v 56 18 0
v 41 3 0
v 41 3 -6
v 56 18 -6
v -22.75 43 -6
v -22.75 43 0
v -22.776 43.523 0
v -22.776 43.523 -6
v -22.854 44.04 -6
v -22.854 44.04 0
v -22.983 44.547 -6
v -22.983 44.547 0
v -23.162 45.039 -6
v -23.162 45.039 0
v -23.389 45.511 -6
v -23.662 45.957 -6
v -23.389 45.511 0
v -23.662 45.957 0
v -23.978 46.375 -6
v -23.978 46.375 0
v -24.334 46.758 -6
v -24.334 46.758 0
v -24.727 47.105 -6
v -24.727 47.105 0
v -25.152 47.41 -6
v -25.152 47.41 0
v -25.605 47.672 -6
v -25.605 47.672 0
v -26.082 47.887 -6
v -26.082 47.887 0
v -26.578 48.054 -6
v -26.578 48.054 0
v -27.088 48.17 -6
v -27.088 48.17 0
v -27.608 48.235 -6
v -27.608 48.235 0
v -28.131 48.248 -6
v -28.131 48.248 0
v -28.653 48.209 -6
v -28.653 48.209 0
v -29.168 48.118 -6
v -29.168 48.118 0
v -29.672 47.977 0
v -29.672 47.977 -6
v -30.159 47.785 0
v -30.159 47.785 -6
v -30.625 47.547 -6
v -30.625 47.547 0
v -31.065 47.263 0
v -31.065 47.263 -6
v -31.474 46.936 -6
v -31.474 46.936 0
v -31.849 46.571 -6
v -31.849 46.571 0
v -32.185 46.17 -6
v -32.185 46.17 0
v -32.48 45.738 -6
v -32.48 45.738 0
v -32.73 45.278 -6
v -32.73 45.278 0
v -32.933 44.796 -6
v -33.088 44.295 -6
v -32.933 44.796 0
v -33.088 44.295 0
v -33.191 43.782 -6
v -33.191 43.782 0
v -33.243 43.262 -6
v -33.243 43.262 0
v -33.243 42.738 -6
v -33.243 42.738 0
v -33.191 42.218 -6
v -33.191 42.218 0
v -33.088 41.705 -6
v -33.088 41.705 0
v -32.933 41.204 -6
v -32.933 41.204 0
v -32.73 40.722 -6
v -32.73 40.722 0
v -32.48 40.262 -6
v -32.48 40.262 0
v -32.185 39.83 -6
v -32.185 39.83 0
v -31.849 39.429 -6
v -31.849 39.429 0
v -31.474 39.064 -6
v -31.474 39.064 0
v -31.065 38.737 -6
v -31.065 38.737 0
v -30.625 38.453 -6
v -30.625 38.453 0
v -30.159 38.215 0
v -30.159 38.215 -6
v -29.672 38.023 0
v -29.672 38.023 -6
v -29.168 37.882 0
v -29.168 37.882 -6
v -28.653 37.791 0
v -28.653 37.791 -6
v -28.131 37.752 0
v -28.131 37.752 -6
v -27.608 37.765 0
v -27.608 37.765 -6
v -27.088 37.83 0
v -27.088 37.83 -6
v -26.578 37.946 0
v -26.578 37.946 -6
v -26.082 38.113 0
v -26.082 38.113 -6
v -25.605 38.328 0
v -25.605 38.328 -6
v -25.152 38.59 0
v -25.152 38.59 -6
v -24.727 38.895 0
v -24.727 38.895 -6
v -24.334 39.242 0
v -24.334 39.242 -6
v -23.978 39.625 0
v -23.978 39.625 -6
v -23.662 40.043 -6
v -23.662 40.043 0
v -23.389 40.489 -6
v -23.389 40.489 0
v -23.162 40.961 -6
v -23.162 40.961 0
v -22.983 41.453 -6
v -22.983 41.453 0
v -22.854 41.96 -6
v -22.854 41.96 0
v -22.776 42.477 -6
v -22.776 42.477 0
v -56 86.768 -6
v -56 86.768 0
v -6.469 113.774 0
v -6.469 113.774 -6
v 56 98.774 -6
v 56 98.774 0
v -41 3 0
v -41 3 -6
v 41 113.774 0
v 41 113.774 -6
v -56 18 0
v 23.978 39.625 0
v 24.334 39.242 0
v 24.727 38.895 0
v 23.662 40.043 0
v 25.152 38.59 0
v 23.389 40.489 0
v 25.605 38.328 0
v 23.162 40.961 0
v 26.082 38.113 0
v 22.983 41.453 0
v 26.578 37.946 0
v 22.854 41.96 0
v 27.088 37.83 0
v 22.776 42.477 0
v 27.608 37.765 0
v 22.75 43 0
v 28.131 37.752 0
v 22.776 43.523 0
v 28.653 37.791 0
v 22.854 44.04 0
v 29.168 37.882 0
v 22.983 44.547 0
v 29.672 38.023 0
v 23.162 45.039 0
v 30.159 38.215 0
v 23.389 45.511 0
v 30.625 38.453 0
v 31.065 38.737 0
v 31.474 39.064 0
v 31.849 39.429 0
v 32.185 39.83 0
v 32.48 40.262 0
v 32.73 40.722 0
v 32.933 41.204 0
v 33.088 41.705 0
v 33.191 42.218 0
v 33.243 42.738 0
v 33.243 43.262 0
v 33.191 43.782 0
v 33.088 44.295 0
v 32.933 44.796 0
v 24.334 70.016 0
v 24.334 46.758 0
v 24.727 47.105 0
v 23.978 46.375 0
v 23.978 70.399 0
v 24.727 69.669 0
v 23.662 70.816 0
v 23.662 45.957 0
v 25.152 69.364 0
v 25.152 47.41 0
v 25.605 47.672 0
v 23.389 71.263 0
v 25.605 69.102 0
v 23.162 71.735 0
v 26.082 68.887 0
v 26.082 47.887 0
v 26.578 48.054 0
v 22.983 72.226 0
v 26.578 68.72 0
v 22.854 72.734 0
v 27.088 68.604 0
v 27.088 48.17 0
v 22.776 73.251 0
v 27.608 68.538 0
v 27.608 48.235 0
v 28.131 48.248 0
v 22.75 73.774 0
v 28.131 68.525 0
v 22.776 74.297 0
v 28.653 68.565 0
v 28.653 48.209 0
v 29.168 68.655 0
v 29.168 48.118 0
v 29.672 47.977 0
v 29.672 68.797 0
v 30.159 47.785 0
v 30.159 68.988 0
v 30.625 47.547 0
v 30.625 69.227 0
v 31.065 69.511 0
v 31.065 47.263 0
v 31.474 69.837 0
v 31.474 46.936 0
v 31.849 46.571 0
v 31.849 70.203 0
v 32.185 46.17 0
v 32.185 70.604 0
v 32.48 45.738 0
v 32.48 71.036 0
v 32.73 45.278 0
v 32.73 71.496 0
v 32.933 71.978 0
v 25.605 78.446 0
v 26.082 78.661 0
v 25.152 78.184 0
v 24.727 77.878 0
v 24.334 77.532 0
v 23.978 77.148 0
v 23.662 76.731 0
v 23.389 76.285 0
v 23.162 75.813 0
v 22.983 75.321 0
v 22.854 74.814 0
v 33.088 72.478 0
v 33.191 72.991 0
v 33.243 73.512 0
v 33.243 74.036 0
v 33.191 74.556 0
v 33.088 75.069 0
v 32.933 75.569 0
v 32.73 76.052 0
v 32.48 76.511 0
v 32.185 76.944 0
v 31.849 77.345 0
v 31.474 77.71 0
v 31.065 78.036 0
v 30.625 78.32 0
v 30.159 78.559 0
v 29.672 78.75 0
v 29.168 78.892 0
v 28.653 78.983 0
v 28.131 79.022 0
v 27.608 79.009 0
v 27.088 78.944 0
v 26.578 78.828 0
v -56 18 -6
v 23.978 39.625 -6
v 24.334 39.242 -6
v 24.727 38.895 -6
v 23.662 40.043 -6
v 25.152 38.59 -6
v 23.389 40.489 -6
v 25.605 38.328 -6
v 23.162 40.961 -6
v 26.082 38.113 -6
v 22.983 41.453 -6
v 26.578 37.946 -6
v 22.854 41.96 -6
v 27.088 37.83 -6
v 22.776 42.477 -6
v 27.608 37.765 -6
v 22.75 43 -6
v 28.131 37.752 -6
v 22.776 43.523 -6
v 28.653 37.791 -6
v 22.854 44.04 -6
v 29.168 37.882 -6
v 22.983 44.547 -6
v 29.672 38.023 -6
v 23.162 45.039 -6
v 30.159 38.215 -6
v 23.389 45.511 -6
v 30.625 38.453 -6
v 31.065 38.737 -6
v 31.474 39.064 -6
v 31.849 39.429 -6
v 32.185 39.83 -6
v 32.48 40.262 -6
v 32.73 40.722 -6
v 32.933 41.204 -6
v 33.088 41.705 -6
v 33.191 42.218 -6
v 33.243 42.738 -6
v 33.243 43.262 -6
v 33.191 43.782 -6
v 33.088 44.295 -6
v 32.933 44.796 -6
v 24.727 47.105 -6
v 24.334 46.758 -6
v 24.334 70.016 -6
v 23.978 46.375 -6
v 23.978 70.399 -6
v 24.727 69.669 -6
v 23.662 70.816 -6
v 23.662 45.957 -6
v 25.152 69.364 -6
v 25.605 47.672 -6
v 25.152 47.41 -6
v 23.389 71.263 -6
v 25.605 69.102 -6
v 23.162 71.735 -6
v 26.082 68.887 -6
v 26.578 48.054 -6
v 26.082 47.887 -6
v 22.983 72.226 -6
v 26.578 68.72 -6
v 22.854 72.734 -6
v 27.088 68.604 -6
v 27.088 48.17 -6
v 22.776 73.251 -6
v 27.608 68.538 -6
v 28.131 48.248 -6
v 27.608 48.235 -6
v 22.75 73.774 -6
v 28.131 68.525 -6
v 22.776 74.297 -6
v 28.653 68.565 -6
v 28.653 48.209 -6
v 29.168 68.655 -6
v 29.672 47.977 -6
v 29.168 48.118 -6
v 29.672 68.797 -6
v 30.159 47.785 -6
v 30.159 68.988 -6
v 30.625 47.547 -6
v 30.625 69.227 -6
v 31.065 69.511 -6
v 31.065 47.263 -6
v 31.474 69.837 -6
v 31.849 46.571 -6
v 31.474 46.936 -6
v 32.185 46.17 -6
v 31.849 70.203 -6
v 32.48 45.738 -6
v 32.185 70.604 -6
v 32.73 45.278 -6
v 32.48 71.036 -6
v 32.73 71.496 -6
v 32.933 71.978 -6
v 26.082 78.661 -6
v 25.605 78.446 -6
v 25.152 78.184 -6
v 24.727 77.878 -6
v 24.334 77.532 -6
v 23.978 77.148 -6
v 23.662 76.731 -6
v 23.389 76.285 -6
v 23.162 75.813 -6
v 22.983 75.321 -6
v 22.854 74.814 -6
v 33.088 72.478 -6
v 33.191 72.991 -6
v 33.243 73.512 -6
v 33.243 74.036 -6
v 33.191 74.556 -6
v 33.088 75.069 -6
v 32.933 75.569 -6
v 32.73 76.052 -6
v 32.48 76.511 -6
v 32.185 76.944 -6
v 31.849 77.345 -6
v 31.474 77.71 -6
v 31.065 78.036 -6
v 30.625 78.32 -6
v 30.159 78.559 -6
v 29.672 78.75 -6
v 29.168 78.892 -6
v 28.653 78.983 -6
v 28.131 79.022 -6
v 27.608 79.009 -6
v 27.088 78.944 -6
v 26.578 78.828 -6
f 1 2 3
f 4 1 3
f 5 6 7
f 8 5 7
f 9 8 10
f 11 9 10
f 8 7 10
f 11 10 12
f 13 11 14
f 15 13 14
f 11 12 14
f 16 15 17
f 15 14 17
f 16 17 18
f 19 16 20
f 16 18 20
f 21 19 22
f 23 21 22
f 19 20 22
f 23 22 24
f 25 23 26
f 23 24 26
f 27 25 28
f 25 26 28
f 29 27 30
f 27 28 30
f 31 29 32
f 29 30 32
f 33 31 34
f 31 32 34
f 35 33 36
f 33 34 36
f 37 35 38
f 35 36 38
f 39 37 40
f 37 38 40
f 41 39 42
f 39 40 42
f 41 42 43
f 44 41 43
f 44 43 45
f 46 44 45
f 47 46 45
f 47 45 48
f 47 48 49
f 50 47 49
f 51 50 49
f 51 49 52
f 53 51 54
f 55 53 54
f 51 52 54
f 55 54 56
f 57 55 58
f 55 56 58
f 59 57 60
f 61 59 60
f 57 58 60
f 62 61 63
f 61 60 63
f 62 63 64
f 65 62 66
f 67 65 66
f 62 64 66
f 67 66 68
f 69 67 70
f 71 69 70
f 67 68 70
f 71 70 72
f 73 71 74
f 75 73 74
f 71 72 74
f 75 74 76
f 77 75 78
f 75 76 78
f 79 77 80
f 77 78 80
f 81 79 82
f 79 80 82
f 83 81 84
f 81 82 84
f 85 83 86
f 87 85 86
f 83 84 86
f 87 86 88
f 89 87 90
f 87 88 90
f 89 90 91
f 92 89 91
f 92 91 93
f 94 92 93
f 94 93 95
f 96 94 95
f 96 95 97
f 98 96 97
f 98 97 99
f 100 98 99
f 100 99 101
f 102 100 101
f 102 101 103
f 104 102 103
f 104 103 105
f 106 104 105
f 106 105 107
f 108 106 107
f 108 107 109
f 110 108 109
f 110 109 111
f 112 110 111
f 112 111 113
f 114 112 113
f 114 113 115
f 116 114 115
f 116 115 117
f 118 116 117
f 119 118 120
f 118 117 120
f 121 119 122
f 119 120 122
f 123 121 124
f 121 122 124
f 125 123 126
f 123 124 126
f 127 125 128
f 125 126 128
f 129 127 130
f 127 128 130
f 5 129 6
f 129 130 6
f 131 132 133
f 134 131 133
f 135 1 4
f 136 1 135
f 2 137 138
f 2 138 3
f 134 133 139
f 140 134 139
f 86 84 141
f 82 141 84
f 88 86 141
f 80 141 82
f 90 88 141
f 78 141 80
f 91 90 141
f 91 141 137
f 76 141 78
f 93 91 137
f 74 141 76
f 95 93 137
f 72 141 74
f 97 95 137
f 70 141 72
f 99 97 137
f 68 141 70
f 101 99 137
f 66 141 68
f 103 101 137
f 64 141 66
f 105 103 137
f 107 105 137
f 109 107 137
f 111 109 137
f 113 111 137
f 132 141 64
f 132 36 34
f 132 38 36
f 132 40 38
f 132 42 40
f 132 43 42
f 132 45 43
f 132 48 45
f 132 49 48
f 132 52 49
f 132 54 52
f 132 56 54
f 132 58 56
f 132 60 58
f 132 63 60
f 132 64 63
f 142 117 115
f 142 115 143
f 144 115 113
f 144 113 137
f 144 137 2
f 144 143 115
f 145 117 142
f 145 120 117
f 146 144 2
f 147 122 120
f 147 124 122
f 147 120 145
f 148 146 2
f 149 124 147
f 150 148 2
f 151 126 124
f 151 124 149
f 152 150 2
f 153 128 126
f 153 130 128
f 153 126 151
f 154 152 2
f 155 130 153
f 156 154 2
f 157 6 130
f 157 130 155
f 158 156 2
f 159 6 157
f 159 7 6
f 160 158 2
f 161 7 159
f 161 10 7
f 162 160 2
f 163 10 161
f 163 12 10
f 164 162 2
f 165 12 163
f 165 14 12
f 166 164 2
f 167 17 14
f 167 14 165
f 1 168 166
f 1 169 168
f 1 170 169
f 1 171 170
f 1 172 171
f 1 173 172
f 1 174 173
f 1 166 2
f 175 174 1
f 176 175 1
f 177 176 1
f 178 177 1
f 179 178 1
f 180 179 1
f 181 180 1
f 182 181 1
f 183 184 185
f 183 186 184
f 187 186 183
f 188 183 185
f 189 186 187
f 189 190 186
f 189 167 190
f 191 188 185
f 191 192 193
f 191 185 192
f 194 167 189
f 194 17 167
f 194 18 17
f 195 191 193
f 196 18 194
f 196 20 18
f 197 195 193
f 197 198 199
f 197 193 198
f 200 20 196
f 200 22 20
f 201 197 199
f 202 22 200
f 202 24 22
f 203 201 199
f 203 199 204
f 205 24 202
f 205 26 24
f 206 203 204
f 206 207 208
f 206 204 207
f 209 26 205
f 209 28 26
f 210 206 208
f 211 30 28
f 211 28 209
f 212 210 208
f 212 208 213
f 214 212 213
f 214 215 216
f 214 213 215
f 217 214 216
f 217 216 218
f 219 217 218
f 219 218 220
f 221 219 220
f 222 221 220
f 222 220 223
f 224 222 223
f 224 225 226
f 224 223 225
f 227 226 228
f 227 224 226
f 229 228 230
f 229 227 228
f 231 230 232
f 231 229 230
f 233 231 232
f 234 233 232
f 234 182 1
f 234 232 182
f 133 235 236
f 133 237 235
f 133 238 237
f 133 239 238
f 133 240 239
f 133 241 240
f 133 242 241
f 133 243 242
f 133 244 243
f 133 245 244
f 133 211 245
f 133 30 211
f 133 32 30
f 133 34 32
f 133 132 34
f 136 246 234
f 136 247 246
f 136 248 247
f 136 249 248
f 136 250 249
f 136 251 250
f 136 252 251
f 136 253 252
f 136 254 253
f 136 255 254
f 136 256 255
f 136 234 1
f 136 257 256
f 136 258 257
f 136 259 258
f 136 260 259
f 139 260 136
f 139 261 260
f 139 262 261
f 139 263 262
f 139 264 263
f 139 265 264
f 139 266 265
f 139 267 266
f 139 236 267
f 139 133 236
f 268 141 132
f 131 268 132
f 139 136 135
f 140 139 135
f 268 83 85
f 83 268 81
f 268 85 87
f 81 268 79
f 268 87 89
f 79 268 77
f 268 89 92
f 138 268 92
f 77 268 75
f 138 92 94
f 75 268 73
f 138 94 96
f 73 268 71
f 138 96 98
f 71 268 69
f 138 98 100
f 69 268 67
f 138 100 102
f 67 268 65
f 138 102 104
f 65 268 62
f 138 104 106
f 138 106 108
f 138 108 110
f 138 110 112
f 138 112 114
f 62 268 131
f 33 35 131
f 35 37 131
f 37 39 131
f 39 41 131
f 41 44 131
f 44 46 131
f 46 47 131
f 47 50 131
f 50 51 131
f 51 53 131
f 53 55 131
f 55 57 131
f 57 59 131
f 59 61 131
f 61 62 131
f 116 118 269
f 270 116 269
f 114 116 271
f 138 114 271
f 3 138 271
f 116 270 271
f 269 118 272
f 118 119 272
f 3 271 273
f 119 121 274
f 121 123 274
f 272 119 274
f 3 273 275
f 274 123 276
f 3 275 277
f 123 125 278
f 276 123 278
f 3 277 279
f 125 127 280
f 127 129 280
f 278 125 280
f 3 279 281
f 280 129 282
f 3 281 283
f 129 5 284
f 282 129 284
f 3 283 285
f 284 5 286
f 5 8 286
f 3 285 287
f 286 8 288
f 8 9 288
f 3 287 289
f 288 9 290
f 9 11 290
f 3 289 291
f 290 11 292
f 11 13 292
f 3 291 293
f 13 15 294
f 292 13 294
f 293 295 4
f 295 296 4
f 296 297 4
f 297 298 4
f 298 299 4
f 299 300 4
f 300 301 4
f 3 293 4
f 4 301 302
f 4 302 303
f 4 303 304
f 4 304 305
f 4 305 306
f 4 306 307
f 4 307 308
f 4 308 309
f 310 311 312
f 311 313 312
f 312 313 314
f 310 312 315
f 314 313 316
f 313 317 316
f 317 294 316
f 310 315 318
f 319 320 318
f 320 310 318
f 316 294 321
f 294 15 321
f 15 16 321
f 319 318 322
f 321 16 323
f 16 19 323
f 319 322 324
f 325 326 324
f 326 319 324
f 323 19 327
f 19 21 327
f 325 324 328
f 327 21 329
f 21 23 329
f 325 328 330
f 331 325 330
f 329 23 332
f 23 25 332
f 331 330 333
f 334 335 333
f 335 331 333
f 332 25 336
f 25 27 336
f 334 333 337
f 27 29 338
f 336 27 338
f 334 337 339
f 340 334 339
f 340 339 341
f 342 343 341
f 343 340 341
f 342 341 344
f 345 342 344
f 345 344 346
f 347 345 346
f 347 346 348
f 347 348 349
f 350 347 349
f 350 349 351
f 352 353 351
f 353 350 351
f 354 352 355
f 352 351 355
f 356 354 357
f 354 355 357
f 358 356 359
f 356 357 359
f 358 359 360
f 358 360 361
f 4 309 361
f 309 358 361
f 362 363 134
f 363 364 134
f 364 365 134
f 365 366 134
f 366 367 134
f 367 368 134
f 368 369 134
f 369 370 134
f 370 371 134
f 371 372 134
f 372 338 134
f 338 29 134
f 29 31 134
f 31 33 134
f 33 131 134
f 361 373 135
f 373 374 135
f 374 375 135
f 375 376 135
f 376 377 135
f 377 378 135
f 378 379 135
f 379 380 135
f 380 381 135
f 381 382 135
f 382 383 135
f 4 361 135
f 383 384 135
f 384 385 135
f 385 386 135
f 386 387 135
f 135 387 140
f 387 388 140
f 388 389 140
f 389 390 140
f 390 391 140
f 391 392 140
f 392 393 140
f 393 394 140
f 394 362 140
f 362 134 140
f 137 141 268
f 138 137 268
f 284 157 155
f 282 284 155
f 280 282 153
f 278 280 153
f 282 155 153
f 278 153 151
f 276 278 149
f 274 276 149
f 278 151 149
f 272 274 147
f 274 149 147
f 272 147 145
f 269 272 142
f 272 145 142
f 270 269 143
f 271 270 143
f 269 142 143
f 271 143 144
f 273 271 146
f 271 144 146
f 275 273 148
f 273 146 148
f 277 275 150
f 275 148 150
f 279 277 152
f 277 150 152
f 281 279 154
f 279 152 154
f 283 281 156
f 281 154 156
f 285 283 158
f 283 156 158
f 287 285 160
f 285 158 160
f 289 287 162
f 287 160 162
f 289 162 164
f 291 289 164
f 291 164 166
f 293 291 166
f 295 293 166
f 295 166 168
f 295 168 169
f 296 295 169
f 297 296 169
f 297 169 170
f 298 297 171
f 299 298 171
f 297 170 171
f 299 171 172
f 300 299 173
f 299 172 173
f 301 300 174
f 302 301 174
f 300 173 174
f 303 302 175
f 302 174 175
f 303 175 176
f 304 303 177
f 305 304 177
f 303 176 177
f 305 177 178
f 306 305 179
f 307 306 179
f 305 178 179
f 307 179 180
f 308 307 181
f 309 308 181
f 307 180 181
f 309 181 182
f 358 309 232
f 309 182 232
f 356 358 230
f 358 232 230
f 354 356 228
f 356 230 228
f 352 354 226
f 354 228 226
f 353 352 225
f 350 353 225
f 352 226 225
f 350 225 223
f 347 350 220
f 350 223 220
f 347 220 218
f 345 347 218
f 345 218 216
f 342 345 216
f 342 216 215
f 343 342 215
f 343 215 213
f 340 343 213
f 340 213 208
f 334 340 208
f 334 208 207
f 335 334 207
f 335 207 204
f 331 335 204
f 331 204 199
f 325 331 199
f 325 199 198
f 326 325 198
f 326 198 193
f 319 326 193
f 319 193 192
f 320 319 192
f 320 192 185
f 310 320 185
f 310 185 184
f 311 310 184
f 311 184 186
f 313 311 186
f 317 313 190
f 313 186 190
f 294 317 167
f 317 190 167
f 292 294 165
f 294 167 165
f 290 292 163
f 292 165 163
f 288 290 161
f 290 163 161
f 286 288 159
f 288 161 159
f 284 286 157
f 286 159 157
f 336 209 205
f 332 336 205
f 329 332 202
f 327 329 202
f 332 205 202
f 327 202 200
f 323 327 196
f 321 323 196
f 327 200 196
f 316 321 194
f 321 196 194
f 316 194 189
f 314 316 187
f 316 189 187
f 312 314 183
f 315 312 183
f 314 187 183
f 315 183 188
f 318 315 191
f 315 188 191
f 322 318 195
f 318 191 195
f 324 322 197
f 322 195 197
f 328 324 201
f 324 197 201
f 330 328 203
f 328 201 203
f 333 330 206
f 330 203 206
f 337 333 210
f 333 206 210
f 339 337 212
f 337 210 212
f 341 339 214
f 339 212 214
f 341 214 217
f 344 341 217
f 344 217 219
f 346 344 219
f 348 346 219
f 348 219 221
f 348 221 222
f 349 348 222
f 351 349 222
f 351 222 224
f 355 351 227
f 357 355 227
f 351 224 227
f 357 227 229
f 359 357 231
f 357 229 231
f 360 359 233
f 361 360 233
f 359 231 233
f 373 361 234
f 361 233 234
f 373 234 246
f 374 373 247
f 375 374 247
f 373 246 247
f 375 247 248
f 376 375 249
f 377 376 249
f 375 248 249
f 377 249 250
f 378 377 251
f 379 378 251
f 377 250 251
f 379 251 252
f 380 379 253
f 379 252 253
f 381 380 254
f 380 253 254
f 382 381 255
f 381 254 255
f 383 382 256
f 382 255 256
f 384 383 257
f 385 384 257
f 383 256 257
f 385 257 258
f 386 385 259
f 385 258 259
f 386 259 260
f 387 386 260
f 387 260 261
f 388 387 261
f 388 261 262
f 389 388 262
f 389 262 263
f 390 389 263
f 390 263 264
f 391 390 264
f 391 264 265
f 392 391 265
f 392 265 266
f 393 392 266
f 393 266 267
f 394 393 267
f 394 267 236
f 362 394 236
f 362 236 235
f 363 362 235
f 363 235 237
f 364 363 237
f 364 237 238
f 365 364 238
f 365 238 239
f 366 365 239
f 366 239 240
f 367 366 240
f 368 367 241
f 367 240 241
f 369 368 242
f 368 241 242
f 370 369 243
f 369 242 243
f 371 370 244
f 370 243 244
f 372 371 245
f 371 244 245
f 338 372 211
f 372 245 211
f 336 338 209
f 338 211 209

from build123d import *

# Parameters (mm, degrees)
SKETCH_1_W             = 112
SKETCH_1_H             = 110.77381068
SKETCH_1_R             = 5.25
SM_BASE_FLANGE_1_DEPTH = 6
CHAMFER_1_SIZE         = 15
CUT_EXTRUDE_1_DEPTH    = 10


# Sheet-metal steps are written as plain solids
with BuildPart() as part:
    # Sketch 1 → Базовая кромка1 (new body)
    with BuildSketch(Plane.XY):
        with Locations((0, 58.38690534)):
            Rectangle(SKETCH_1_W, SKETCH_1_H)
        with Locations((-28, 43)):
            Circle(SKETCH_1_R, mode=Mode.SUBTRACT)
        with Locations(Location((28, 73.77381068, 0), (0, 0, 180))):
            Circle(SKETCH_1_R, mode=Mode.SUBTRACT)
        with Locations(Location((28, 43, 0), (0, 0, 180))):
            Circle(SKETCH_1_R, mode=Mode.SUBTRACT)
    extrude(amount=-SM_BASE_FLANGE_1_DEPTH)

    # Фаска1
    chamfer_1_edges = [part.edges().sort_by_distance(p)[0] for p in [
        (56, 3, -3),
        (-56, 3, -3),
        (-56, 113.77381068, -3),
        (56, 113.77381068, -3),
    ]]
    chamfer(chamfer_1_edges, length=CHAMFER_1_SIZE)

    # Sketch 2 → Вырез-Вытянуть1 (cut)
    with BuildSketch(Plane.XY):
        Polygon((-56, 113.77381068), (-56, 86.768448621), (-6.468509112, 113.77381068), align=None)
    extrude(amount=-CUT_EXTRUDE_1_DEPTH, mode=Mode.SUBTRACT)


solid = part.part
